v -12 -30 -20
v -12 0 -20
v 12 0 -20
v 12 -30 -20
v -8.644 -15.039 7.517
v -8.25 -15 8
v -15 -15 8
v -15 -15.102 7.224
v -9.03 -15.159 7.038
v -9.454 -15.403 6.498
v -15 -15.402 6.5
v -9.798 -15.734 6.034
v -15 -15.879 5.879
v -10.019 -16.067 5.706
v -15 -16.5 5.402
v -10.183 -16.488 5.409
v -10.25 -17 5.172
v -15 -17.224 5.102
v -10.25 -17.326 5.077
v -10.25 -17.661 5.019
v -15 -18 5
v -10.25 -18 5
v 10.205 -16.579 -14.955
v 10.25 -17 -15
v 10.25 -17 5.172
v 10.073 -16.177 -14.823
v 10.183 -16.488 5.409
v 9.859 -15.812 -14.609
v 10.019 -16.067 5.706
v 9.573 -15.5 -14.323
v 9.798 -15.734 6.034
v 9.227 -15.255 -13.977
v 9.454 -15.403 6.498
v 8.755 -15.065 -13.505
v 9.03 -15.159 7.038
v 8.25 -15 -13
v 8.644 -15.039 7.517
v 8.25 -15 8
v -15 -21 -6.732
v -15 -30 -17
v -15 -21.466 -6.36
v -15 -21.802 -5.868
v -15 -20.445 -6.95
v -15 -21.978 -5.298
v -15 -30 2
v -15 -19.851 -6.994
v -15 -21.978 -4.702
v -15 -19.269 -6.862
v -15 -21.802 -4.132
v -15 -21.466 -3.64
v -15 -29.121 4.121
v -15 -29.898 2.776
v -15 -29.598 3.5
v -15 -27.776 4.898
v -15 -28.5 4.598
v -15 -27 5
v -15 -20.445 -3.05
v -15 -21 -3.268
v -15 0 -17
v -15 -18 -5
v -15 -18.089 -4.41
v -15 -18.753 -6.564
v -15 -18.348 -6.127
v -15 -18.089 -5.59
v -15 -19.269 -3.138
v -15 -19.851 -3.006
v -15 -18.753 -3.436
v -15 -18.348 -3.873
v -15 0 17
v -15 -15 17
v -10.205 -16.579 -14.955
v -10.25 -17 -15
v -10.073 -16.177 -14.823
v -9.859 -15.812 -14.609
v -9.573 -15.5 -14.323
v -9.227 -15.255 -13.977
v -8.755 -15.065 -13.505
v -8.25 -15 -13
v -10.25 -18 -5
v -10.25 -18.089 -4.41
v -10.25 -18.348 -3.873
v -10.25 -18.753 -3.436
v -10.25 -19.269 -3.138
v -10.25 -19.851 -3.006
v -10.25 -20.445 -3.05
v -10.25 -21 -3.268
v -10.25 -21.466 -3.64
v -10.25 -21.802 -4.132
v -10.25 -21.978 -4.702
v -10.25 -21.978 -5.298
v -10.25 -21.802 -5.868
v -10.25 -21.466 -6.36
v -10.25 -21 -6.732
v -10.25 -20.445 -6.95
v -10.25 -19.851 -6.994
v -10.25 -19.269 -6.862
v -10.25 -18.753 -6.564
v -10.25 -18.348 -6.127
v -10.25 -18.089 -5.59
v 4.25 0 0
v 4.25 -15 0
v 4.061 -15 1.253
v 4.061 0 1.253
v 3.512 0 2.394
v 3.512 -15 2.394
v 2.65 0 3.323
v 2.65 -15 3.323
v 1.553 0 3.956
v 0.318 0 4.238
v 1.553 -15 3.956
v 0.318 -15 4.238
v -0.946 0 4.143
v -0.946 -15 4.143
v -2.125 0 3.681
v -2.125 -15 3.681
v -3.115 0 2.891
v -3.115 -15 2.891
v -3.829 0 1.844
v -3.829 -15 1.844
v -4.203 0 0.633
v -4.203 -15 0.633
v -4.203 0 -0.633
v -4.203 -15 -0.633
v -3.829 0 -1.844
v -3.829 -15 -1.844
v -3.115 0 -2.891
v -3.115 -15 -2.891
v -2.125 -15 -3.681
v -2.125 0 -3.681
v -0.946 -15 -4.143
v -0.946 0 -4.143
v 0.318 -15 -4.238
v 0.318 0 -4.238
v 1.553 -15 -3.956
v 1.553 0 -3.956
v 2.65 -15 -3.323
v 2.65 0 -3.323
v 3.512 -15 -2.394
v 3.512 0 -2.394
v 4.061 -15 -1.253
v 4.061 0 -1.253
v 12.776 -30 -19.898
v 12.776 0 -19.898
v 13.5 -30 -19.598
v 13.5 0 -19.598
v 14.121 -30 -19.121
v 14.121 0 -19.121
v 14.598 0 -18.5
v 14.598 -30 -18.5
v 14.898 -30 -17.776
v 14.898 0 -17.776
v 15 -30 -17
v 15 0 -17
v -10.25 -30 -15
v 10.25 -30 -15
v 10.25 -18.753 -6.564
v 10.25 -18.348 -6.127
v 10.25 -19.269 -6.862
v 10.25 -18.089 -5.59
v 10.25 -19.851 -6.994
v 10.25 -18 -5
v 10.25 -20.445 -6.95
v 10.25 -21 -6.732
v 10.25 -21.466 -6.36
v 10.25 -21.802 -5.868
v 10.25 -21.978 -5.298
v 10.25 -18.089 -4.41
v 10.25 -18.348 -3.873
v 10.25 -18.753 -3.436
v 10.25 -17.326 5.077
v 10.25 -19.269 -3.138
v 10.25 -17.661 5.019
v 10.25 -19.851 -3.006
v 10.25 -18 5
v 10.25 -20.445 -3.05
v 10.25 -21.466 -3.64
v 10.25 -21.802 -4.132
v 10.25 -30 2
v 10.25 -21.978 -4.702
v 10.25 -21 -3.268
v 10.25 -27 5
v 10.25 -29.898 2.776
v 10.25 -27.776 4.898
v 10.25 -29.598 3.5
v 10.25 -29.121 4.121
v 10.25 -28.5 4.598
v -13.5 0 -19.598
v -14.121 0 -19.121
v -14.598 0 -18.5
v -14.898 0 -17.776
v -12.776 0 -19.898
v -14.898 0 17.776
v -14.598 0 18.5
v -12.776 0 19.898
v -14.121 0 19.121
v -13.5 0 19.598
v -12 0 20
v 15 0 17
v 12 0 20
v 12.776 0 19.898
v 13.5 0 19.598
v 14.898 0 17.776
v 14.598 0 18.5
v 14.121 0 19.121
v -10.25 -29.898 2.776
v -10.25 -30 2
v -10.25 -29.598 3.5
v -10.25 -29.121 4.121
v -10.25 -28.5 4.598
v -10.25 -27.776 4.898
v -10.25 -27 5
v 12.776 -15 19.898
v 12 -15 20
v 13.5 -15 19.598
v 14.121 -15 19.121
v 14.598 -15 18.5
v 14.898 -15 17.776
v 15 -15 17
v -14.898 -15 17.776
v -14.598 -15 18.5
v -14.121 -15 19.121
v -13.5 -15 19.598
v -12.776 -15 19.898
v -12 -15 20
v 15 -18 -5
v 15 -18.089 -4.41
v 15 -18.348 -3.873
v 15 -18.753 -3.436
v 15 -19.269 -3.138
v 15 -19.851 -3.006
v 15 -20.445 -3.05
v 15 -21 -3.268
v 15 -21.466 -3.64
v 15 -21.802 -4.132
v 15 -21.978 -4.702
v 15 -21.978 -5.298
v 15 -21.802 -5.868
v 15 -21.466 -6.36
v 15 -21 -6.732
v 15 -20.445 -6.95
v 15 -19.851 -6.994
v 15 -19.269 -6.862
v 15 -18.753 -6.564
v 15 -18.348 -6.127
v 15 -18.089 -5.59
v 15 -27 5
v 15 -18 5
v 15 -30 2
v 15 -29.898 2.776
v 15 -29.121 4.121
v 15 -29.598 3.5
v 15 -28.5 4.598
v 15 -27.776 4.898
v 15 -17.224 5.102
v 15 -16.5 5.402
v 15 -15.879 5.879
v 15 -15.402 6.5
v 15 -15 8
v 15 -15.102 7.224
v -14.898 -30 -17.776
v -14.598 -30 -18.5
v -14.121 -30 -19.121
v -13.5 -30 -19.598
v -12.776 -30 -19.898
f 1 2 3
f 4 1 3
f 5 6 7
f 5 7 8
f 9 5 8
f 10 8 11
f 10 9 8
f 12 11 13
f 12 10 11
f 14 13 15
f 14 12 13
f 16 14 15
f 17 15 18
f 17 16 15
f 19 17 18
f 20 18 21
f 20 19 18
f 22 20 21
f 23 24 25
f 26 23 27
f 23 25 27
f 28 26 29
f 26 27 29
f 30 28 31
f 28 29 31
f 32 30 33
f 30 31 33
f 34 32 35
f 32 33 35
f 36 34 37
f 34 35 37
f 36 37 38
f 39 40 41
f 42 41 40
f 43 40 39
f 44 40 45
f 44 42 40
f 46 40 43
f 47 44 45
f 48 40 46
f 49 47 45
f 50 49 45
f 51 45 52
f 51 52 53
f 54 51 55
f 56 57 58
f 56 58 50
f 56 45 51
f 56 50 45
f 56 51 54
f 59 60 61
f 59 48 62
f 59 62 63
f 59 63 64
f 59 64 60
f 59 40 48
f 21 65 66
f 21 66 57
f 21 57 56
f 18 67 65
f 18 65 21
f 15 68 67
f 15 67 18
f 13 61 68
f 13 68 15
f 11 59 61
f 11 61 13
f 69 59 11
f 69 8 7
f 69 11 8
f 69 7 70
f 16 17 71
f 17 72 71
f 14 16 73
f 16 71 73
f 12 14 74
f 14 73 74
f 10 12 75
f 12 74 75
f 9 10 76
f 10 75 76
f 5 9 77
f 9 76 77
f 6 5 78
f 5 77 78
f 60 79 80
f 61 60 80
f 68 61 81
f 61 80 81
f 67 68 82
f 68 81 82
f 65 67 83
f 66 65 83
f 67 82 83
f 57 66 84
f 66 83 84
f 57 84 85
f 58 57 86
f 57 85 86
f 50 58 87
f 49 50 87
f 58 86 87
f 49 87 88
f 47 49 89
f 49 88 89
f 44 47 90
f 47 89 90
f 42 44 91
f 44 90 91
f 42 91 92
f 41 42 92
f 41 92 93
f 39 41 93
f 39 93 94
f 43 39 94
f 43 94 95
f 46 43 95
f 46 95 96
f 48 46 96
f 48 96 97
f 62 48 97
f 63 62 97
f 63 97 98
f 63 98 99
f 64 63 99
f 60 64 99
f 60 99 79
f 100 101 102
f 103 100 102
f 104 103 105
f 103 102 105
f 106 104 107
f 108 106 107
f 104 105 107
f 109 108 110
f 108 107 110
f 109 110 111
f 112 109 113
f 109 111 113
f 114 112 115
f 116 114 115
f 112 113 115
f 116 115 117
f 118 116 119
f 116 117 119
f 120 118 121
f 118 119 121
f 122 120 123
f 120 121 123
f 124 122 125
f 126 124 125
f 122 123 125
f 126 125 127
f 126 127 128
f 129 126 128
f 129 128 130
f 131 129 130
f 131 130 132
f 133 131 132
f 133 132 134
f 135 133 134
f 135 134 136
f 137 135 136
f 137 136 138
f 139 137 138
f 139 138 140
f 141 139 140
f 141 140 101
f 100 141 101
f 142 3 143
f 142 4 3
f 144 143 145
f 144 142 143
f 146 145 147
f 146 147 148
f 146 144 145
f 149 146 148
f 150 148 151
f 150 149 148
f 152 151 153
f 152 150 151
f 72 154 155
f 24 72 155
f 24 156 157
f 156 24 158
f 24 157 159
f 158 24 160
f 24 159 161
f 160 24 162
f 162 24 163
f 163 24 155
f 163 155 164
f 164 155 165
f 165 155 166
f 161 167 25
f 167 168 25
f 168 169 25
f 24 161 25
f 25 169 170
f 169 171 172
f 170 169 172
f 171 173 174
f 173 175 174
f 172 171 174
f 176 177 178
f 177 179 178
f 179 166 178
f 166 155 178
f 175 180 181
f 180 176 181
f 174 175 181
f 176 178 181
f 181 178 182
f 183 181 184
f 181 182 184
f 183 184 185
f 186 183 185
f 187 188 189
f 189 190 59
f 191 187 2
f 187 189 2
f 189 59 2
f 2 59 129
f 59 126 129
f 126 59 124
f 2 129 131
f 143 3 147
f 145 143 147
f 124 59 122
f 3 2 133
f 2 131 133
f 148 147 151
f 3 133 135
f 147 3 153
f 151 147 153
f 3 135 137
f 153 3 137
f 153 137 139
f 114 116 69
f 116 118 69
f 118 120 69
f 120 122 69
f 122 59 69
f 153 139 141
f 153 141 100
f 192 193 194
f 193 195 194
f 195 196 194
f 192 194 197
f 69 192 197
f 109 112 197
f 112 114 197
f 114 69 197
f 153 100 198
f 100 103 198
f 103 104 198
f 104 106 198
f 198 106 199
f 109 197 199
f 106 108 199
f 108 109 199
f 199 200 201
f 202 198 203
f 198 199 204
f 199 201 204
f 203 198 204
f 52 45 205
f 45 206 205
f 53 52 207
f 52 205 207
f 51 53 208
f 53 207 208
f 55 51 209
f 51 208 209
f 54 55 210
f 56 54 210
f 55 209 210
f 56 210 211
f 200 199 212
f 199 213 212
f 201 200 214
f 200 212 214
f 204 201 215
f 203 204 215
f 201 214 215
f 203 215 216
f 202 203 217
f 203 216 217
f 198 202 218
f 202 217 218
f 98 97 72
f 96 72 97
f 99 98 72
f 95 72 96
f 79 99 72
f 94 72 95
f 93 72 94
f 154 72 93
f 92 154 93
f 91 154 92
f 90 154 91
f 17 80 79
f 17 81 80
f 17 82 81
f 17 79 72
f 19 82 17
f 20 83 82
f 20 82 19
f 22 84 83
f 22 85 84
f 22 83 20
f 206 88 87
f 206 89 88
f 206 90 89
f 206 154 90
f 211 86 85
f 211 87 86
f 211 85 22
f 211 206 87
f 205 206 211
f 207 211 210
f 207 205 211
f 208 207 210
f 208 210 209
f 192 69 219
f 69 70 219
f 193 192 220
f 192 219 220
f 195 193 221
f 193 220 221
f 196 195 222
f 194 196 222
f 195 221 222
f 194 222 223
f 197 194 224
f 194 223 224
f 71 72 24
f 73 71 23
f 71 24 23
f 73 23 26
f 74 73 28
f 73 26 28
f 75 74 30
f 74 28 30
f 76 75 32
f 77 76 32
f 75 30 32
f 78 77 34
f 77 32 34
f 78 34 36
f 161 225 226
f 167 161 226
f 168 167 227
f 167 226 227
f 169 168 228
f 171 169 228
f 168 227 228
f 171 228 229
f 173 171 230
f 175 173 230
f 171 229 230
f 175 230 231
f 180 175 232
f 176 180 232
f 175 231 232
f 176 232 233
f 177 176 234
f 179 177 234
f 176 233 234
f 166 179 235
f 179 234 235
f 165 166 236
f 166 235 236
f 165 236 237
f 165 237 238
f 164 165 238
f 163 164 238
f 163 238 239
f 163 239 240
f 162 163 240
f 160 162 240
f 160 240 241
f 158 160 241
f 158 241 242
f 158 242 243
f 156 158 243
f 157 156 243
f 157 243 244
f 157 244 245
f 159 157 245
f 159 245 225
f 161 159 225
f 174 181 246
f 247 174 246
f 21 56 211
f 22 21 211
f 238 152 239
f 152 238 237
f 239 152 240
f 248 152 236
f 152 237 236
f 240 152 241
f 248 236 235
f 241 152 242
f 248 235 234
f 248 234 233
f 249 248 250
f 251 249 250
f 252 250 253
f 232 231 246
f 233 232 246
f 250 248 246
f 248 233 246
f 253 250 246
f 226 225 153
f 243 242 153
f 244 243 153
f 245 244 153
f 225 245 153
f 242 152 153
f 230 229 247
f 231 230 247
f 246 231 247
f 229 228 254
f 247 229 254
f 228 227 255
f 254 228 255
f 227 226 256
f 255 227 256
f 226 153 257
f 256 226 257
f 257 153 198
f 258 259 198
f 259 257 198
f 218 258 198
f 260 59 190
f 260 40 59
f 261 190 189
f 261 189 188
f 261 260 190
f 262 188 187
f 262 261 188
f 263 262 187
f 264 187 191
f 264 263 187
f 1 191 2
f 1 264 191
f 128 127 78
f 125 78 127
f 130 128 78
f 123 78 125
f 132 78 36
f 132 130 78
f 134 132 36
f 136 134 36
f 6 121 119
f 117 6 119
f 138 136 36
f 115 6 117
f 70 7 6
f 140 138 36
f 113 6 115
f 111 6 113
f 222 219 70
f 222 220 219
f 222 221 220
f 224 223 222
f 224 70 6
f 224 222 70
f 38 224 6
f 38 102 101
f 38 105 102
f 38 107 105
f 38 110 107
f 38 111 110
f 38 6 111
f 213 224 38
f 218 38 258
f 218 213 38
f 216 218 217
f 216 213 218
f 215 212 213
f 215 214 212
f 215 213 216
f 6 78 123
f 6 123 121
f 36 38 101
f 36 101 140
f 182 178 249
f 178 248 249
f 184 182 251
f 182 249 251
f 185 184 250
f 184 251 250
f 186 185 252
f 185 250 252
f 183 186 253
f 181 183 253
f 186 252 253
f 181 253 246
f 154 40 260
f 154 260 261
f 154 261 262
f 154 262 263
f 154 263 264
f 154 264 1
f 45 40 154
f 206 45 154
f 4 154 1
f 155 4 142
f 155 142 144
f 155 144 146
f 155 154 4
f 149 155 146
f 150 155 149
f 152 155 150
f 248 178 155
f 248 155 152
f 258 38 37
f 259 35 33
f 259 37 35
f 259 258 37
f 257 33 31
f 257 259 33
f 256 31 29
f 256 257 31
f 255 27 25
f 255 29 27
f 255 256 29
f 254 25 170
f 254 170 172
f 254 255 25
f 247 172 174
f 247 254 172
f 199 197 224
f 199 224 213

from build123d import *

# Parameters (mm, degrees)
F0_W     = 30
F0_H     = 40
F1_DEPTH = 30
F2_W     = 20.5
F2_H     = 30
F3_DEPTH = 15
F4_W     = 34.05
F4_H     = 15
F5_DEPTH = 15
F6_R     = 4.25
F7_DEPTH = 25
F8_R     = 2
F9_DEPTH = 30.001
F10_R    = 3
F11_R    = 2


with BuildPart() as f1:
    # F0 (on Front) → F1 (new body)
    with BuildSketch(Plane.XZ):
        Rectangle(F0_W, F0_H)
    extrude(amount=F1_DEPTH)

    # F2 (on face) → F3 (cut)
    with BuildSketch(Plane.XZ.offset(30)):
        Rectangle(F2_W, F2_H)
    extrude(amount=-F3_DEPTH, mode=Mode.SUBTRACT)

    # F4 (on face) → F5 (cut)
    with BuildSketch(Plane.XZ.offset(30)):
        with Locations((2.025, 12.5)):
            Rectangle(F4_W, F4_H)
    extrude(amount=-F5_DEPTH, mode=Mode.SUBTRACT)

    # F6 (on face) → F7 (cut)
    with BuildSketch(Plane.XZ.offset(15)):
        Circle(F6_R)
    extrude(amount=-F7_DEPTH, mode=Mode.SUBTRACT)

    # F8 (on face) → F9 (cut, through all)
    with BuildSketch(Plane.YZ.offset(15)):
        with Locations((-20, -5)):
            Circle(F8_R)
    extrude(amount=-F9_DEPTH, mode=Mode.SUBTRACT)

    # F10
    f10_edges = [f1.edges().sort_by_distance(p)[0] for p in [
        (15, -7.5, 20),
        (12.625, -30, 5),
        (-12.625, -30, 5),
        (12.625, -15, 5),
        (-12.625, -15, 5),
        (-15, -7.5, 20),
        (-15, -15, -20),
        (15, -15, -20),
    ]]
    fillet(f10_edges, radius=F10_R)

    # F11
    f11_edges = [f1.edges().sort_by_distance(p)[0] for p in [
        (-10.25, -15, -5),
        (0, -15, -15),
        (10.25, -15, -5),
    ]]
    fillet(f11_edges, radius=F11_R)


solid = f1.part
